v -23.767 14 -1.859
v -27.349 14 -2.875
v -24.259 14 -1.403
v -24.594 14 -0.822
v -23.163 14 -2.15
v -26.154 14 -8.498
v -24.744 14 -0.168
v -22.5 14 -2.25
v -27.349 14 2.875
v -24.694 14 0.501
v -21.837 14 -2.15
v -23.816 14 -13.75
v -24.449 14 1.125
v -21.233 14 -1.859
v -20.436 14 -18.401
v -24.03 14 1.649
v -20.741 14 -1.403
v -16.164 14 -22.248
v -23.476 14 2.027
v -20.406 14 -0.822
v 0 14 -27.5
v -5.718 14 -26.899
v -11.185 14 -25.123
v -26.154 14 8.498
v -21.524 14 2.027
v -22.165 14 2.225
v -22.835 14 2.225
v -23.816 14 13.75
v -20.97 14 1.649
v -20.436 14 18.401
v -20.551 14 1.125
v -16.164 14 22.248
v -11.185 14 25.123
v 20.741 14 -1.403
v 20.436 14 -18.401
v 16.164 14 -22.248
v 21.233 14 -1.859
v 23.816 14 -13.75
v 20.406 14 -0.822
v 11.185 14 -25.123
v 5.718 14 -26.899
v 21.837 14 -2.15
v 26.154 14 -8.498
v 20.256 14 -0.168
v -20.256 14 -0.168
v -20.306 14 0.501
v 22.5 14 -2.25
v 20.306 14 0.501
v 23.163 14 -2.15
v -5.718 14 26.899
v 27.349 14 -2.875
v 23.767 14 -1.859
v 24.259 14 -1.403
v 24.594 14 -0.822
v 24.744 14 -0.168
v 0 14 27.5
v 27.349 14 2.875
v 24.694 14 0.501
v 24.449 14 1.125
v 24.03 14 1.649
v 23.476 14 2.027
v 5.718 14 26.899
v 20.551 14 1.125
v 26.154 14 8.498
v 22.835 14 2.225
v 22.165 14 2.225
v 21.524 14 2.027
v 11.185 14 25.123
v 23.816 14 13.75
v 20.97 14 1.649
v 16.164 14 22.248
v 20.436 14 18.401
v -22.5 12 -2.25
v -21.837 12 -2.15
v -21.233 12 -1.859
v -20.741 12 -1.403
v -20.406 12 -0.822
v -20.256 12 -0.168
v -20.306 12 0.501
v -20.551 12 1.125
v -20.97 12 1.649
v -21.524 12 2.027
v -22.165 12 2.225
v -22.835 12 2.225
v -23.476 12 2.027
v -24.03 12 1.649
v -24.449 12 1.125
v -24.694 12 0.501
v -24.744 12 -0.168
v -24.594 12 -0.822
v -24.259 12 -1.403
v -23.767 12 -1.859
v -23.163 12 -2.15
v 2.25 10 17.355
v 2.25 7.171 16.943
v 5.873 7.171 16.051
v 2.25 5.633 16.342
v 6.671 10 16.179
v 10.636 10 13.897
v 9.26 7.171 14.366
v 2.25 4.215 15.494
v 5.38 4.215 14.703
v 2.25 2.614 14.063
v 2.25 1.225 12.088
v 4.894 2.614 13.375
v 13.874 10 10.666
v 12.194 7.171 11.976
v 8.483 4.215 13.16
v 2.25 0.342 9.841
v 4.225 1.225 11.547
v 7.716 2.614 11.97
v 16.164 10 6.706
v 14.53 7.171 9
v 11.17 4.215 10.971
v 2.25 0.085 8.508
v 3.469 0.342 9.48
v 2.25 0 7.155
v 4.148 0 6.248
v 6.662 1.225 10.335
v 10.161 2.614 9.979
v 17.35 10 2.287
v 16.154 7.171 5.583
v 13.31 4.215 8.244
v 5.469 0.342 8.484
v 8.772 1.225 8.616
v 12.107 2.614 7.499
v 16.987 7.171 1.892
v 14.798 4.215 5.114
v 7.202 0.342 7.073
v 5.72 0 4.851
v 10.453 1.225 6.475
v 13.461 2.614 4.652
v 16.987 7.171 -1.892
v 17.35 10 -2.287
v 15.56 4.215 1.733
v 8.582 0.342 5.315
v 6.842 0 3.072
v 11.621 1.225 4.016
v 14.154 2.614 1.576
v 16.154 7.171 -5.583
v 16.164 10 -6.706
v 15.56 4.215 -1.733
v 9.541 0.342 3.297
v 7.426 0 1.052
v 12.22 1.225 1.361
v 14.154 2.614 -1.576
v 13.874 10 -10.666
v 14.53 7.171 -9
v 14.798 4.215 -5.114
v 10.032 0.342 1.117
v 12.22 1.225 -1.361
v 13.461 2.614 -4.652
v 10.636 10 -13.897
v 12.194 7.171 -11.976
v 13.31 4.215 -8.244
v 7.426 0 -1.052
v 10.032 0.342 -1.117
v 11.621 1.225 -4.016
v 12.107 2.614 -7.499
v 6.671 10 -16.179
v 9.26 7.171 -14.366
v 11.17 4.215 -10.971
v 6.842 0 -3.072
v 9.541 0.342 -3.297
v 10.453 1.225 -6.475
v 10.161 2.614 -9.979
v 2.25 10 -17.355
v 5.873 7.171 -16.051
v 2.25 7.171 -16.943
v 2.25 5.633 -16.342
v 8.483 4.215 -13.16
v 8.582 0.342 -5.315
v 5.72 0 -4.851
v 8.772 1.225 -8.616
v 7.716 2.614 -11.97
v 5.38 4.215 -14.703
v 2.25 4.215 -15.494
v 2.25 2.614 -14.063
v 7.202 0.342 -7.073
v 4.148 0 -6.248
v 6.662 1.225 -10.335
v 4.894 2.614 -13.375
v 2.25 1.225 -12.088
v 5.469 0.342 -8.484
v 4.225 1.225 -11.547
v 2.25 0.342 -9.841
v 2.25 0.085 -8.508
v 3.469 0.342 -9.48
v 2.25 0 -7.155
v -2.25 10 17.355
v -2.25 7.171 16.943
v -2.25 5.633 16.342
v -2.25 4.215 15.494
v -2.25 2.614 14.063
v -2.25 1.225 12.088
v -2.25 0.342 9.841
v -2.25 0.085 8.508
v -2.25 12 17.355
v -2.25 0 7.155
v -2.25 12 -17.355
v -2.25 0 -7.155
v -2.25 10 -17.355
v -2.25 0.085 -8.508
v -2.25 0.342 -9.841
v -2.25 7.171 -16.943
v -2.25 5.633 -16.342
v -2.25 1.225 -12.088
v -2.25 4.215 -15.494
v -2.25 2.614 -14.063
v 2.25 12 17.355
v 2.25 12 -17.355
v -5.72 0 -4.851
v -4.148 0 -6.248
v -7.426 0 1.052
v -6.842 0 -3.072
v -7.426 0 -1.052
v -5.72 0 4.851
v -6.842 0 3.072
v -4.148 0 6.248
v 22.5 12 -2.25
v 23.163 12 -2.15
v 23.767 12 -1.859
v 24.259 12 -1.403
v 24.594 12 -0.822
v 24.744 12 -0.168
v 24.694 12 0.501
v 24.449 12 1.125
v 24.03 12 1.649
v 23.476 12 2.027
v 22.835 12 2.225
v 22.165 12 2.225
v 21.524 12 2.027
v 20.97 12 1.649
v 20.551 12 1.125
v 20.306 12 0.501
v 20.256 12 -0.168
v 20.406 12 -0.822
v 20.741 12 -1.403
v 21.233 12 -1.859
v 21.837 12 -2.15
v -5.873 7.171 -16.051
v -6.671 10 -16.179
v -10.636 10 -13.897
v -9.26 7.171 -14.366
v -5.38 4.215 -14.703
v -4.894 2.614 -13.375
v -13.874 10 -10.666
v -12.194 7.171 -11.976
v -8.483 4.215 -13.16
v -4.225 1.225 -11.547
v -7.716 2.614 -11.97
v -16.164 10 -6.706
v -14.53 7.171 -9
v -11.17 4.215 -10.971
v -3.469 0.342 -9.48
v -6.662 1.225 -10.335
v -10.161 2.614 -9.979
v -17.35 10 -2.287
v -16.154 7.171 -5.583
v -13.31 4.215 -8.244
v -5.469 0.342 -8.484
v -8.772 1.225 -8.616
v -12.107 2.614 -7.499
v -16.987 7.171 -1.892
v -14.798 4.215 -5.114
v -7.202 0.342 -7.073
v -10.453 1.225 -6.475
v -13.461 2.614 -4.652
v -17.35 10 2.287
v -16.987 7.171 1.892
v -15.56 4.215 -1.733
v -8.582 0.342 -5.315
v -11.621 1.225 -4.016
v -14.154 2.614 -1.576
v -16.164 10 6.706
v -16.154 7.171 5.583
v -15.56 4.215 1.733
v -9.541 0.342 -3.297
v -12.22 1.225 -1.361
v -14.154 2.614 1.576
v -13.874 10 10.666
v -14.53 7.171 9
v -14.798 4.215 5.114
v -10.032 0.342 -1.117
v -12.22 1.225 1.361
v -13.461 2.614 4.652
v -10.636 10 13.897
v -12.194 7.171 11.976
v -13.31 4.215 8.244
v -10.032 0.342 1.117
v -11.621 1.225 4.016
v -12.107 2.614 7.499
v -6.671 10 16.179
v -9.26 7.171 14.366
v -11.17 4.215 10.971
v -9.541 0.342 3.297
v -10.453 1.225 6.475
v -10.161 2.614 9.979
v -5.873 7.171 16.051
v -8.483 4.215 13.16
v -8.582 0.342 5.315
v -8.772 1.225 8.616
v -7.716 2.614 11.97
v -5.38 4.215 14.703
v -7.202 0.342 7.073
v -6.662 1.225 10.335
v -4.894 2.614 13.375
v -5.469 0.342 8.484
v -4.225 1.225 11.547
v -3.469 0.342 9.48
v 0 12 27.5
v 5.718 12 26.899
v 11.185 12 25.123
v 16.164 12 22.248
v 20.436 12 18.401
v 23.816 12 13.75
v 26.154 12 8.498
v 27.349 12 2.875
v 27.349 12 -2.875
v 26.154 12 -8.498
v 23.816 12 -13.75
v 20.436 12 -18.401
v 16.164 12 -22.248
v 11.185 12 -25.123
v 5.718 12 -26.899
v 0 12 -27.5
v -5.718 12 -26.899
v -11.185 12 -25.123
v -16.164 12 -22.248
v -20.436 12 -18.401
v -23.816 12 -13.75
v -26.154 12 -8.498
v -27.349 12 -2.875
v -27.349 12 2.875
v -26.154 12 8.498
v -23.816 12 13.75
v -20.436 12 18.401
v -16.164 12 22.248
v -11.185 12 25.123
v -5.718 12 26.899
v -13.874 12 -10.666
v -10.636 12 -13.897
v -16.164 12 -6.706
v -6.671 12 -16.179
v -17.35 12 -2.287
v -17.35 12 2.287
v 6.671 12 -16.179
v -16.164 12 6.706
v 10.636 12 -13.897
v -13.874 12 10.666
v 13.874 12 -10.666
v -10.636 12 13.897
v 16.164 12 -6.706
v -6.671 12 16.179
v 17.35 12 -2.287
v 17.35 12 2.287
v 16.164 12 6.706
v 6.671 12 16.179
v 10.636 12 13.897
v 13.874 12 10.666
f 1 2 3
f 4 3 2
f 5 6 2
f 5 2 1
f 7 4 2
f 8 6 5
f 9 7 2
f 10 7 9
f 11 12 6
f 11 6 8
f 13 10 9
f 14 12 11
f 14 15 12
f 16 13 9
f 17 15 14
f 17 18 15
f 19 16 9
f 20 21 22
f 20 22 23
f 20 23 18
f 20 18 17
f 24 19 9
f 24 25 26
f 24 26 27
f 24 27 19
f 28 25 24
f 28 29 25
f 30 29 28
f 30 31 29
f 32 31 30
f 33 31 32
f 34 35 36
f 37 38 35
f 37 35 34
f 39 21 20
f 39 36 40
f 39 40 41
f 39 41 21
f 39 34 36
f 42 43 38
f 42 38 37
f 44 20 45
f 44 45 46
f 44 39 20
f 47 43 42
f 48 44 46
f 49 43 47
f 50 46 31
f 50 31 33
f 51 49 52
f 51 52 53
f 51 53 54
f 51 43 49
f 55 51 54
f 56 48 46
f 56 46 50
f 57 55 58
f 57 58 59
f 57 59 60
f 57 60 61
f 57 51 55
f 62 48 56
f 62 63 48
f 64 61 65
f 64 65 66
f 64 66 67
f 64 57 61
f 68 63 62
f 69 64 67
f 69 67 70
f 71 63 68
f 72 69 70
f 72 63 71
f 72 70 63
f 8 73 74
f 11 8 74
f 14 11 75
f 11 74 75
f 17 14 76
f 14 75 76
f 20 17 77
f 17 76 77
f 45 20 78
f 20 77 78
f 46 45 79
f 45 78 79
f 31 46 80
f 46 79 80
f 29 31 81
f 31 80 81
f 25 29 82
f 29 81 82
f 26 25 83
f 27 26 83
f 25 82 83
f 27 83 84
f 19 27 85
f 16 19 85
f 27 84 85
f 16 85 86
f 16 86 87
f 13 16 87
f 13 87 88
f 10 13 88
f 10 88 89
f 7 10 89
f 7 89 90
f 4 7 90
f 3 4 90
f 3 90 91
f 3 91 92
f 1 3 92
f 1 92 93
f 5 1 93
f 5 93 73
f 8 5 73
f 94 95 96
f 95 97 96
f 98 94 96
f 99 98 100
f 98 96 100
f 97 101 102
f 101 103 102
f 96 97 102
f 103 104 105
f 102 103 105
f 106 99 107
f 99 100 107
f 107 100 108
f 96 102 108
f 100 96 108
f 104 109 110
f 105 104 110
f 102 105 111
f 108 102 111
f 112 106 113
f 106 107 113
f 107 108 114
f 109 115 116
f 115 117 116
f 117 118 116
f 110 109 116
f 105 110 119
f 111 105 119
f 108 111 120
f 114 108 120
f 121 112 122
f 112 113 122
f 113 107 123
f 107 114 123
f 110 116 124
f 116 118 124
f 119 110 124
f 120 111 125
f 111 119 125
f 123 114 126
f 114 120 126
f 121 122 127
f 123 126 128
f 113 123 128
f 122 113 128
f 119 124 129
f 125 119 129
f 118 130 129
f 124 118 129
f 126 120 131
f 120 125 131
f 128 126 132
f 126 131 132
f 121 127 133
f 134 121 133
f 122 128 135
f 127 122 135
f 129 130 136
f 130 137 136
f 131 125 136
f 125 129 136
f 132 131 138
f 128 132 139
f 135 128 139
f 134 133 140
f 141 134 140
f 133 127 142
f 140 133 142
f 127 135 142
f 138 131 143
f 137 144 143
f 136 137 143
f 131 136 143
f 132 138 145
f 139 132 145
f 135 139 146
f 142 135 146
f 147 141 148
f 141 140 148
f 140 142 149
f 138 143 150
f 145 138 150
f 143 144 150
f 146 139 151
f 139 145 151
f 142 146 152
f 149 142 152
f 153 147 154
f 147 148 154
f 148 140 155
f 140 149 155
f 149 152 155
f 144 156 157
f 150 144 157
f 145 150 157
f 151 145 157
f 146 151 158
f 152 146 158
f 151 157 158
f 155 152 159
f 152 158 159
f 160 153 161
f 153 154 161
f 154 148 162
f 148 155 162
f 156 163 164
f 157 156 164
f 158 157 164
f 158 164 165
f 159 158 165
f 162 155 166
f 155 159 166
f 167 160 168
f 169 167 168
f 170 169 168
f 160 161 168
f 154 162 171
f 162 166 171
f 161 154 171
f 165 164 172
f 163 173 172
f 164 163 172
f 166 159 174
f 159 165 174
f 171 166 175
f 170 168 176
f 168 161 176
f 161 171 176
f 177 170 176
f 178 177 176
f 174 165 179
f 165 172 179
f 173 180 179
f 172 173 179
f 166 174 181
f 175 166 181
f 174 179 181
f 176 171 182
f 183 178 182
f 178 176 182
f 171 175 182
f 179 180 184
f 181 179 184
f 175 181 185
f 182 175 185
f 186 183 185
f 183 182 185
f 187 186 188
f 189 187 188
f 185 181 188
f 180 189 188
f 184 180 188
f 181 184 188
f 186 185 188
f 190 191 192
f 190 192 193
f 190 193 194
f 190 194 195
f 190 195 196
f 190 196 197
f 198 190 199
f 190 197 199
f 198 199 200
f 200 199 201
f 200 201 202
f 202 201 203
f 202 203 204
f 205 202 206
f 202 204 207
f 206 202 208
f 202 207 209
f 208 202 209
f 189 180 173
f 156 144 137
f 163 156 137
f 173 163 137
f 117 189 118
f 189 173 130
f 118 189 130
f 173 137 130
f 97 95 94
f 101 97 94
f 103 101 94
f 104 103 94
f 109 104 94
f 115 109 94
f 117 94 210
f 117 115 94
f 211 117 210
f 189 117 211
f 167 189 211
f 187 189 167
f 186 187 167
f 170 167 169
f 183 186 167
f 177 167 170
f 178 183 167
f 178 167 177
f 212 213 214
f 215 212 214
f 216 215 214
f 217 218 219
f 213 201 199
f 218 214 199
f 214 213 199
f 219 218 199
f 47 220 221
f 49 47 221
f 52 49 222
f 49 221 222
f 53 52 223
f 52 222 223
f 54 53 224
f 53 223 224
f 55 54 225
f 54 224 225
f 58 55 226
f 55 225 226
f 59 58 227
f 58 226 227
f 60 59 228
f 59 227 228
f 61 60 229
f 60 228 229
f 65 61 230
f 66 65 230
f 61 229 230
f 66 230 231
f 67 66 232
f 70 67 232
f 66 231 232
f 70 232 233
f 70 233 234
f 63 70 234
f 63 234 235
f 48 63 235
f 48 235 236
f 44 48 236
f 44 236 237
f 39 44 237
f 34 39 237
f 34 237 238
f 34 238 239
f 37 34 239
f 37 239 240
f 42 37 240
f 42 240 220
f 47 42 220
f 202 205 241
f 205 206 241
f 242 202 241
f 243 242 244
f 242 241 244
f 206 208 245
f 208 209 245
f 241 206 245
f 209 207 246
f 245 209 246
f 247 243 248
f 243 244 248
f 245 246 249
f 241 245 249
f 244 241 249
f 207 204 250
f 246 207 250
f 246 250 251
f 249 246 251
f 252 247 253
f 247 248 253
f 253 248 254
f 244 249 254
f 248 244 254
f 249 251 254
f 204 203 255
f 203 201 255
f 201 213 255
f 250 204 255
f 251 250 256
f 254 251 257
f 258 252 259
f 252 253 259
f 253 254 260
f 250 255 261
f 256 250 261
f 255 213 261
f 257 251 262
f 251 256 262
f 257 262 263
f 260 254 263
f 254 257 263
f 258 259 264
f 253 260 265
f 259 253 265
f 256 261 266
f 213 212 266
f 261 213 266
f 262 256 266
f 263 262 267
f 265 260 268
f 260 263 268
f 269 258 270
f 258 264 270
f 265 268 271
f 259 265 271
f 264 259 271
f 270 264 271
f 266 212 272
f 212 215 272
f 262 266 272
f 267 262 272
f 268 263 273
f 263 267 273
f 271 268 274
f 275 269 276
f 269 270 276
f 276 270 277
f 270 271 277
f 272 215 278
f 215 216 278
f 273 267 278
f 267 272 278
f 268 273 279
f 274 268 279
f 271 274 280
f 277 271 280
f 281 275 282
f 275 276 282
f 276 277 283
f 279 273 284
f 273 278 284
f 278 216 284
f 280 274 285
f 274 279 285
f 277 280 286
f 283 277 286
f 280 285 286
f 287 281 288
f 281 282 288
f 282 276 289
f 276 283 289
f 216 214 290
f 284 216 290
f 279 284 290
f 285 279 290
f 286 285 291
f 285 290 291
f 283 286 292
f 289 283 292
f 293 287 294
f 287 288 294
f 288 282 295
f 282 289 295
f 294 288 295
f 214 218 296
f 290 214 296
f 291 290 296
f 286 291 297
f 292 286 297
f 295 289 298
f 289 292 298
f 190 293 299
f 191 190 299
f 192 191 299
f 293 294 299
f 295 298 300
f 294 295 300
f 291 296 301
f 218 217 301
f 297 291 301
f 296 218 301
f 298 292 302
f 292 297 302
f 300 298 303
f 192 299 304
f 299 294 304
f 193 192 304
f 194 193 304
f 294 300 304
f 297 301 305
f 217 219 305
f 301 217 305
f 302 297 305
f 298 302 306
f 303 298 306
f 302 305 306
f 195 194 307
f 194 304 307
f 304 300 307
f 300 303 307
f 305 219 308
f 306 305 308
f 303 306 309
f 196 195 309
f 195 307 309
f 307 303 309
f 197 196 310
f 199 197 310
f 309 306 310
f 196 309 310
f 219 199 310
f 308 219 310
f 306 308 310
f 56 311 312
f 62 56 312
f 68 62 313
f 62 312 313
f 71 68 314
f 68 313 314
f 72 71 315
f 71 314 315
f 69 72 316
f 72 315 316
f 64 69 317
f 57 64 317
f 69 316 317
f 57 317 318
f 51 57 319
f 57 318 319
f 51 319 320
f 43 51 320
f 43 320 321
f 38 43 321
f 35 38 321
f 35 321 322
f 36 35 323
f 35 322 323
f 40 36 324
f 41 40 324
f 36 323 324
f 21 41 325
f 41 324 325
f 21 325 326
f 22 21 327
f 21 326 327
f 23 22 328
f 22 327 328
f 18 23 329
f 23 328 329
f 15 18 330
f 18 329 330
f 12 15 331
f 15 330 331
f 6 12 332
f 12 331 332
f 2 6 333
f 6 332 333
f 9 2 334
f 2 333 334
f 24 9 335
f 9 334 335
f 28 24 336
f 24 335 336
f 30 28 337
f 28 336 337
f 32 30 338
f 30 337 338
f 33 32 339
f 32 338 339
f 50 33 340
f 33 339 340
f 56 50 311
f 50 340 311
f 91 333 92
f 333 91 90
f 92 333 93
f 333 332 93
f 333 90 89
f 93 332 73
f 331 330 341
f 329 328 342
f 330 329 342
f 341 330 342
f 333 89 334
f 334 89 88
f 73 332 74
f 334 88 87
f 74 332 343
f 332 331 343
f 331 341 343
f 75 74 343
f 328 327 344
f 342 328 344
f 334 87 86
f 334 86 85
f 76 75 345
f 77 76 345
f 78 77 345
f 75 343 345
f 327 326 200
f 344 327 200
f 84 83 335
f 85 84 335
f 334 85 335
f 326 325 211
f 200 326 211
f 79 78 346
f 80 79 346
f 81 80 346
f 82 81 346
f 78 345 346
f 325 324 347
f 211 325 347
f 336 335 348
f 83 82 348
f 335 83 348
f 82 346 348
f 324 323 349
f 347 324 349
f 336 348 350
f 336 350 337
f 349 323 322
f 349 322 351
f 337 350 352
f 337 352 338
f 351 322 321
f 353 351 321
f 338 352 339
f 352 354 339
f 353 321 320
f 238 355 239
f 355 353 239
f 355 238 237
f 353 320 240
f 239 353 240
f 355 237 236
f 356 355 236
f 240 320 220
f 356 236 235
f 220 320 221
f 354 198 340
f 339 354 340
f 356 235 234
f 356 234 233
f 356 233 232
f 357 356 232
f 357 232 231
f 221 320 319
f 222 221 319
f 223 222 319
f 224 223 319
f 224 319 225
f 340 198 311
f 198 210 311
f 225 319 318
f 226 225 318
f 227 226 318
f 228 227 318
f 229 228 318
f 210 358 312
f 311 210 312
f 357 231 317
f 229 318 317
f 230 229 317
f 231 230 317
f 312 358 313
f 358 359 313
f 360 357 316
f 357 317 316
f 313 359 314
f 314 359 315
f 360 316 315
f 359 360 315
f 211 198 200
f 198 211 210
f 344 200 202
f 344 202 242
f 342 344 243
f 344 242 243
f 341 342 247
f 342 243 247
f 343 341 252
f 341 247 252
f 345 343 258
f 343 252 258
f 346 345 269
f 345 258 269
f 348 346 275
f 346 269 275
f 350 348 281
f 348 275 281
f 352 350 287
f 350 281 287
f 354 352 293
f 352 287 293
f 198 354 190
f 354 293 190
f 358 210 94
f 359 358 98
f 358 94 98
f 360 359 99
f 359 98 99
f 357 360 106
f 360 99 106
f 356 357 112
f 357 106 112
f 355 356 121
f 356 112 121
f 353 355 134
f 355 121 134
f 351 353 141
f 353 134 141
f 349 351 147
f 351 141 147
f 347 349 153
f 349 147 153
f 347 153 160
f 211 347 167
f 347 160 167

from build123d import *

# Parameters (mm, degrees)
SKETCH1_R           = 17.5
BOSS_EXTRUDE1_DEPTH = 12
SKETCH2_R           = 27.5
BOSS_EXTRUDE2_DEPTH = 2
SKETCH3_W           = 4.5
SKETCH3_H           = 43.807088702
CUT_EXTRUDE2_DEPTH  = 12
FILLET1_R           = 10
SKETCH4_R           = 2.25
CUT_EXTRUDE3_DEPTH  = 101.6


with BuildPart() as part:
    # Sketch1 → Boss-Extrude1 (new body)
    with BuildSketch(Plane(origin=(0, 0, 0), x_dir=(1, 0, 0), z_dir=(0, 1, 0))):
        with Locations(Location((0, 0, 0), (0, 0, 270))):
            Circle(SKETCH1_R)
    extrude(amount=BOSS_EXTRUDE1_DEPTH)

    # Sketch2 → Boss-Extrude2 (add)
    with BuildSketch(Plane(origin=(0, 12, 0), x_dir=(1, 0, 0), z_dir=(0, 1, 0))):
        with Locations(Location((0, 0, 0), (0, 0, 270))):
            Circle(SKETCH2_R)
    extrude(amount=BOSS_EXTRUDE2_DEPTH)

    # Sketch3 → Cut-Extrude2 (cut)
    with BuildSketch(Plane(origin=(0, 0, 0), x_dir=(-1, 0, 0), z_dir=(0, -1, 0))):
        Rectangle(SKETCH3_W, SKETCH3_H)
    extrude(amount=-CUT_EXTRUDE2_DEPTH, mode=Mode.SUBTRACT)

    # Fillet1
    fillet1_edges = [part.edges().sort_by_distance(p)[0] for p in [
        (-17.5, 0, 0),
        (17.5, 0, 0),
    ]]
    fillet(fillet1_edges, radius=FILLET1_R)

    # Sketch4 → Cut-Extrude3 (cut)
    with BuildSketch(Plane(origin=(0, 12, 0), x_dir=(-1, 0, 0), z_dir=(0, -1, 0))):
        with Locations(Location((-22.5, 0, 0), (0, 0, 90))):
            Circle(SKETCH4_R)
        with Locations(Location((22.5, 0, 0), (0, 0, 90))):
            Circle(SKETCH4_R)
    extrude(amount=-CUT_EXTRUDE3_DEPTH, mode=Mode.SUBTRACT)


solid = part.part
